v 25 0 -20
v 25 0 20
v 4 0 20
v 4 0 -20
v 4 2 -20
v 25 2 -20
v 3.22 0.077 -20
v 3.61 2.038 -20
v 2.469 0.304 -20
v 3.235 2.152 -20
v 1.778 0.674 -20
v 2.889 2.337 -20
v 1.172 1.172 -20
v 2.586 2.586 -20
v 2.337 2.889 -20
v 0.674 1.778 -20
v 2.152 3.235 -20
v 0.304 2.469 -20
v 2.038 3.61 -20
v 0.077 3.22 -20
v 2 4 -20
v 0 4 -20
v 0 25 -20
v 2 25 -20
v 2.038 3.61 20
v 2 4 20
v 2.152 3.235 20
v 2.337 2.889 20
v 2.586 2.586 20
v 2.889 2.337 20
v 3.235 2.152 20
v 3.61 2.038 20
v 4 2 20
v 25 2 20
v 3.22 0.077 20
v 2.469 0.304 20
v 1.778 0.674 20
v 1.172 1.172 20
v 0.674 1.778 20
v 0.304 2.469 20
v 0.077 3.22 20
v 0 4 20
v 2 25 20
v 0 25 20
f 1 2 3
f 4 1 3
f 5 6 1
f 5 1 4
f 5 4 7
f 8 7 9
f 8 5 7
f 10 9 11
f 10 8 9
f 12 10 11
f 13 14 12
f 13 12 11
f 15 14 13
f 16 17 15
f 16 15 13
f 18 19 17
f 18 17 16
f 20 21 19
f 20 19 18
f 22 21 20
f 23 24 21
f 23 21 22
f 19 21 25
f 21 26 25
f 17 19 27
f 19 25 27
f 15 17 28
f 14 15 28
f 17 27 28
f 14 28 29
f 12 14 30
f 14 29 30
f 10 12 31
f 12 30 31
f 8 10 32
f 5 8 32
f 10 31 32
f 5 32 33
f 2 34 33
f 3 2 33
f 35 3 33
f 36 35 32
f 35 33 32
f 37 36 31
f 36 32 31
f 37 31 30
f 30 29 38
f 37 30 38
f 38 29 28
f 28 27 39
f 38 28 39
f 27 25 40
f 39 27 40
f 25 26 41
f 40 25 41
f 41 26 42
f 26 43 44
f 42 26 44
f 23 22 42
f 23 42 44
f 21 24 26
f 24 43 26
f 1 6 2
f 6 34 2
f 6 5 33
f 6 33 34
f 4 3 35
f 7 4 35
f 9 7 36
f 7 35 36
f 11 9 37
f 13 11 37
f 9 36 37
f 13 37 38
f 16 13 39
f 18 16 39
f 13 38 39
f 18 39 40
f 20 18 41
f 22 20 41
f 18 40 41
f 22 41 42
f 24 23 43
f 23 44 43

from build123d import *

# Parameters (mm, degrees)
BOSS_EXTRUDE1_DEPTH = 20


with BuildPart() as part:
    # Sketch1 → Boss-Extrude1 (new body, symmetric)
    with BuildSketch(Plane.XY):
        with BuildLine():
            Line((0, 4), (0, 25))
            Line((0, 25), (2, 25))
            Line((2, 25), (2, 4))
            ThreePointArc((2, 4), (2.585786438, 2.585786438), (4, 2))
            Line((4, 2), (25, 2))
            Line((25, 2), (25, 0))
            Line((25, 0), (4, 0))
            ThreePointArc((4, 0), (1.171572875, 1.171572875), (0, 4))
        make_face()
    extrude(amount=BOSS_EXTRUDE1_DEPTH, both=True)


solid = part.part
